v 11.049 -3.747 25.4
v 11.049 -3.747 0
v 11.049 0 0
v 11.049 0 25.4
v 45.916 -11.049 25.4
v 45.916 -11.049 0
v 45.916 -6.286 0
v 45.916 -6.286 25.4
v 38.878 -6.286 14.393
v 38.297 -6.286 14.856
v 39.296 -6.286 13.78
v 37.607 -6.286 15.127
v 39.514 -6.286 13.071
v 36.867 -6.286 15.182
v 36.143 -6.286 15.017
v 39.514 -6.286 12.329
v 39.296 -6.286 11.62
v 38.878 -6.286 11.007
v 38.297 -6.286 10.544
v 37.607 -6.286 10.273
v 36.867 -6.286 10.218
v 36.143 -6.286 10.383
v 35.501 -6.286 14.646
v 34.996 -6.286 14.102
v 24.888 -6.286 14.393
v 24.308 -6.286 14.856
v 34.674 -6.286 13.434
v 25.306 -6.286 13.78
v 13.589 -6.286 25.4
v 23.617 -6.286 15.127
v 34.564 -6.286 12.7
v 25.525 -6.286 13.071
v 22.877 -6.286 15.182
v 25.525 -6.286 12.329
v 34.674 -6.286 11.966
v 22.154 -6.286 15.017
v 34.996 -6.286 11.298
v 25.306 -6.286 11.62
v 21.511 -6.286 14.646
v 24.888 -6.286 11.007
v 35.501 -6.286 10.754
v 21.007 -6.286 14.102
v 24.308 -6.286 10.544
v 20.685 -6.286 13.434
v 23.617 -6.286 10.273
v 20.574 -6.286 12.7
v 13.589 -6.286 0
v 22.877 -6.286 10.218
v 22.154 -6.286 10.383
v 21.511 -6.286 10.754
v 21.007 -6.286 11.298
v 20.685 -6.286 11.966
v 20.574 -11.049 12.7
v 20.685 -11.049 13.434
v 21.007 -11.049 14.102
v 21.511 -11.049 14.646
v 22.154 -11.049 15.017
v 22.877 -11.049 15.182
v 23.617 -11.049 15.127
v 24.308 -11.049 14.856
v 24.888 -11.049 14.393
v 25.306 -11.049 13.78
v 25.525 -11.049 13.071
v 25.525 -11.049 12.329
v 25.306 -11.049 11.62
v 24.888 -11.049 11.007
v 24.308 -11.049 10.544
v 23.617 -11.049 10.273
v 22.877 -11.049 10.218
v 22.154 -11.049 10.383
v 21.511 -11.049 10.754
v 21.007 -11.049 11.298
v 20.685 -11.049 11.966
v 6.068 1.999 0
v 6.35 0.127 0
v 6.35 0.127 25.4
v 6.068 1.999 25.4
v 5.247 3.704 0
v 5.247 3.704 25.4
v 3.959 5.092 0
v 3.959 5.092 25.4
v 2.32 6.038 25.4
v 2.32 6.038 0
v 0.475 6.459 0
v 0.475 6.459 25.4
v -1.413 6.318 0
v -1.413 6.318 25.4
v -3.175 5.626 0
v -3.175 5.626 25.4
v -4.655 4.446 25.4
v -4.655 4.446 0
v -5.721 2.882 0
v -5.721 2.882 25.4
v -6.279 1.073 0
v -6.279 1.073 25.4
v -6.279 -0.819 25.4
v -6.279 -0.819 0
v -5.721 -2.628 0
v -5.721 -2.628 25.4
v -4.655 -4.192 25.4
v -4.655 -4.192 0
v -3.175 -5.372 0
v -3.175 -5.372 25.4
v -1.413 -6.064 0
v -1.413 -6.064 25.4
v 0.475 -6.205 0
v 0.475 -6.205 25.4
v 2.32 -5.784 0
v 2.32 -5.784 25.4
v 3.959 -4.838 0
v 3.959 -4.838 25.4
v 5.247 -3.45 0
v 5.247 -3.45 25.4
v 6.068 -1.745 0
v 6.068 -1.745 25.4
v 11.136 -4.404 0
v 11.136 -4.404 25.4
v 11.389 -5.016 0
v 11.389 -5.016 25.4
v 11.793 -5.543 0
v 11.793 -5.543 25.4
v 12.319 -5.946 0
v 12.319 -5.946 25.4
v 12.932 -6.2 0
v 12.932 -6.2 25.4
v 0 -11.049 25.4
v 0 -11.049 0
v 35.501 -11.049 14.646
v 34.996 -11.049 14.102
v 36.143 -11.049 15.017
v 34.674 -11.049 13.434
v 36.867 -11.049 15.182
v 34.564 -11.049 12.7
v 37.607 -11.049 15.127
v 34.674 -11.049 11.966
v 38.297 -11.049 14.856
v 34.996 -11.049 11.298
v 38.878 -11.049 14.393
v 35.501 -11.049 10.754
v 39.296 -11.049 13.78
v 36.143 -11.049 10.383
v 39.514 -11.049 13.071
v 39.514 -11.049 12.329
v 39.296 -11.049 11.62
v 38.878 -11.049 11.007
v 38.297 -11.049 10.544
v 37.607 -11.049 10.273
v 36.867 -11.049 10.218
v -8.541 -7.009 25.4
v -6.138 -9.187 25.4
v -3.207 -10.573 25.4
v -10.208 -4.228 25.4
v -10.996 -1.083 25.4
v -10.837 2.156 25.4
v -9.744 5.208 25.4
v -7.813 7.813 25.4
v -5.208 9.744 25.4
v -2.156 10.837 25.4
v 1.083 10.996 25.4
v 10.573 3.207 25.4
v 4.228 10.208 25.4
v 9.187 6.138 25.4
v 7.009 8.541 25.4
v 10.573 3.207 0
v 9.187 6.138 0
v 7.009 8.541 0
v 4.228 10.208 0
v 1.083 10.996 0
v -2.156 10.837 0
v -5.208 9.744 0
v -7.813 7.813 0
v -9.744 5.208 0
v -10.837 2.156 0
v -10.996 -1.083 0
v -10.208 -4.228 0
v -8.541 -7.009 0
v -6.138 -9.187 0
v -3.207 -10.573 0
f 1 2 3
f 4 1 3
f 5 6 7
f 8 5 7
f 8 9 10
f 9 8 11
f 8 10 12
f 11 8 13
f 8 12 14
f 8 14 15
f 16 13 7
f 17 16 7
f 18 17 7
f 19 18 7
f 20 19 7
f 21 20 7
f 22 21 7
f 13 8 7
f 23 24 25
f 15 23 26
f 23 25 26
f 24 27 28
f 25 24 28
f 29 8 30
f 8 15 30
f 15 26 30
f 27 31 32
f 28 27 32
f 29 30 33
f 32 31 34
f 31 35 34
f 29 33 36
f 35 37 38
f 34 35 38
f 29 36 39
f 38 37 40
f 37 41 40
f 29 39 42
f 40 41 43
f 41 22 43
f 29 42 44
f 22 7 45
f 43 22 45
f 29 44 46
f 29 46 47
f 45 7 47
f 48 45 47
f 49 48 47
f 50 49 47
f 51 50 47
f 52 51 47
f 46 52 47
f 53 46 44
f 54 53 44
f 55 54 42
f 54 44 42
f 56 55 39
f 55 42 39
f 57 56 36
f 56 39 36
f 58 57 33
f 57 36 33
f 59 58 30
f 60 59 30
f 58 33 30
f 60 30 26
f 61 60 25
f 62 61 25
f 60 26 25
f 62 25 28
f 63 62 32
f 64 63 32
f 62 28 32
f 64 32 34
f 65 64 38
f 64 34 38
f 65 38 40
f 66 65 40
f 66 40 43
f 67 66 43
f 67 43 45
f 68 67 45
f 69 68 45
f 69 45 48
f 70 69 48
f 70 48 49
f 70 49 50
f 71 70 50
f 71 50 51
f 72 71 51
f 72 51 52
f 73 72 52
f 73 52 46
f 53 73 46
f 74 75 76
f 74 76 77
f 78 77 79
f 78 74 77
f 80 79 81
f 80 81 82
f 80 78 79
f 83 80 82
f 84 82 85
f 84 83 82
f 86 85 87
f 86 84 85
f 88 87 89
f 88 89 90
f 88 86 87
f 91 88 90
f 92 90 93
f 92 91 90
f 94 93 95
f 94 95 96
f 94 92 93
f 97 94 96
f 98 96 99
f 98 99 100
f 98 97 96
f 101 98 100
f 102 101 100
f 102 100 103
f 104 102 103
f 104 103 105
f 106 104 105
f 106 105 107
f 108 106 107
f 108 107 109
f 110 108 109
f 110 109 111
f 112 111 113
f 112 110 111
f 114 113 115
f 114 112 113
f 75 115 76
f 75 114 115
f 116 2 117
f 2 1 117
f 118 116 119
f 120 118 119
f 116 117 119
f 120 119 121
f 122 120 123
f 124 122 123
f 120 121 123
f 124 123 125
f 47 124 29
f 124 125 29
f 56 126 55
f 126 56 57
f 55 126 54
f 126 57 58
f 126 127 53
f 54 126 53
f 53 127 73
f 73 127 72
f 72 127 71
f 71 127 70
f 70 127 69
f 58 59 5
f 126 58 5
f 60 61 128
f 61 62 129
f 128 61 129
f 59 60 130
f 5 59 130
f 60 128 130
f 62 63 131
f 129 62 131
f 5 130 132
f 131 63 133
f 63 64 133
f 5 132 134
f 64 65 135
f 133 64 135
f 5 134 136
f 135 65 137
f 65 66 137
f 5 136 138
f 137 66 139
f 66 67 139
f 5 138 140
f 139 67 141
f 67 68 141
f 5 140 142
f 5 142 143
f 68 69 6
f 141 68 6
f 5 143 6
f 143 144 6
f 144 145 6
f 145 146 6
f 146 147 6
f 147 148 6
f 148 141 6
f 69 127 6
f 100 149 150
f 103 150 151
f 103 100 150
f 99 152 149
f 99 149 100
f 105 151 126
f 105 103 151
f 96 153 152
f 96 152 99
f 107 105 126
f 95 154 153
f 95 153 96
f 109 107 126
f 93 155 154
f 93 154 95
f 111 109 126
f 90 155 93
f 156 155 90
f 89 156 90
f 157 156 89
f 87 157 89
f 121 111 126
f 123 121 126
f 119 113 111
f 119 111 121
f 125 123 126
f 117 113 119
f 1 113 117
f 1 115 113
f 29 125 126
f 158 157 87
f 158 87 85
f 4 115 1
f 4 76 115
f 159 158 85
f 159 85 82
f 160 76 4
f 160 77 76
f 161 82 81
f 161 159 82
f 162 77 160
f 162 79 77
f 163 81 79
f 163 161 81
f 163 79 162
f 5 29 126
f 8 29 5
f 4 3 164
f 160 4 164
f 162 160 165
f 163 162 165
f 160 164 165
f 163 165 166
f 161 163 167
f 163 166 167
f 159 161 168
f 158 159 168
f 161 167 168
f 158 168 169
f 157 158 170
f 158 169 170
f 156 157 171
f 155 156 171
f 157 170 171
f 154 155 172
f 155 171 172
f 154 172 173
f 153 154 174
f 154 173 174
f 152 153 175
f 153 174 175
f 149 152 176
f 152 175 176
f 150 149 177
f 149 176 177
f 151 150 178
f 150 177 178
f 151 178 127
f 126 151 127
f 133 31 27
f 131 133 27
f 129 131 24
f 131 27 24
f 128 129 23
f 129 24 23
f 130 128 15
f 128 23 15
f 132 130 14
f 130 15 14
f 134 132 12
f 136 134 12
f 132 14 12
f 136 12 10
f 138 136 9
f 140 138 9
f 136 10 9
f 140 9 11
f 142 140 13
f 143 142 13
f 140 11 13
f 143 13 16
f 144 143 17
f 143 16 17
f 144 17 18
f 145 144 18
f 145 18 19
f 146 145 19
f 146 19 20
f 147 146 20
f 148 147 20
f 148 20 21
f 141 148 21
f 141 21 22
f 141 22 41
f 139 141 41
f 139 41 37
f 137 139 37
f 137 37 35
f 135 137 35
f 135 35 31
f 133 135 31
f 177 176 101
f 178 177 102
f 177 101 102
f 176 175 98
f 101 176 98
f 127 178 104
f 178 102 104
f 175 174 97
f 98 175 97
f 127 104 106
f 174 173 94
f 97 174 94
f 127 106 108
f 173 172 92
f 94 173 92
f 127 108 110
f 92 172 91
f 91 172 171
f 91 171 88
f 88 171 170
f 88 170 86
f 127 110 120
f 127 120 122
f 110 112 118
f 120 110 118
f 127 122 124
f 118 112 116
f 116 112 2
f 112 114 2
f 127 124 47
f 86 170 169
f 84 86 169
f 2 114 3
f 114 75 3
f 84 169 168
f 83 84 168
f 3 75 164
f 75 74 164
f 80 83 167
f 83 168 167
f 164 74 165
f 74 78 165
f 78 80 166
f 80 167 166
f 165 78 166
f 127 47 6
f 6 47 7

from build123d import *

# Parameters (mm, degrees)
SKETCH1_R           = 6.35
BOSS_EXTRUDE1_DEPTH = 25.4
FILLET1_R           = 2.54
SKETCH2_R           = 2.4892
CUT_EXTRUDE1_DEPTH  = 5.7625


with BuildPart() as part:
    # Sketch1 → Boss-Extrude1 (new body)
    with BuildSketch(Plane.XY):
        with BuildLine():
            Line((11.049, -6.2865), (11.049, 0))
            ThreePointArc((11.049, 0), (-7.812822825, 7.812822825), (0, -11.049))
            Line((0, -11.049), (45.91627088, -11.049))
            Line((45.91627088, -11.049), (45.91627088, -6.2865))
            Line((45.91627088, -6.2865), (11.049, -6.2865))
        make_face()
        with Locations((0, 0.127)):
            Circle(SKETCH1_R, mode=Mode.SUBTRACT)
    extrude(amount=BOSS_EXTRUDE1_DEPTH)

    # Fillet1
    fillet1_edges = [part.edges().sort_by_distance(p)[0] for p in [
        (11.049, -6.2865, 12.7),
    ]]
    fillet(fillet1_edges, radius=FILLET1_R)

    # Sketch2 → Cut-Extrude1 (cut, through all)
    with BuildSketch(Plane(origin=(0, -6.2865, 0), x_dir=(1, 0, 0), z_dir=(0, 1, 0))):
        with Locations(Location((37.052858889, -12.7, 0), (0, 0, 180))):  # turned: the seam where the file's is
            Circle(SKETCH2_R)
        with Locations(Location((23.063244992, -12.7, 0), (0, 0, 180))):  # turned: the seam where the file's is
            Circle(SKETCH2_R)
    extrude(amount=-CUT_EXTRUDE1_DEPTH, mode=Mode.SUBTRACT)


solid = part.part
